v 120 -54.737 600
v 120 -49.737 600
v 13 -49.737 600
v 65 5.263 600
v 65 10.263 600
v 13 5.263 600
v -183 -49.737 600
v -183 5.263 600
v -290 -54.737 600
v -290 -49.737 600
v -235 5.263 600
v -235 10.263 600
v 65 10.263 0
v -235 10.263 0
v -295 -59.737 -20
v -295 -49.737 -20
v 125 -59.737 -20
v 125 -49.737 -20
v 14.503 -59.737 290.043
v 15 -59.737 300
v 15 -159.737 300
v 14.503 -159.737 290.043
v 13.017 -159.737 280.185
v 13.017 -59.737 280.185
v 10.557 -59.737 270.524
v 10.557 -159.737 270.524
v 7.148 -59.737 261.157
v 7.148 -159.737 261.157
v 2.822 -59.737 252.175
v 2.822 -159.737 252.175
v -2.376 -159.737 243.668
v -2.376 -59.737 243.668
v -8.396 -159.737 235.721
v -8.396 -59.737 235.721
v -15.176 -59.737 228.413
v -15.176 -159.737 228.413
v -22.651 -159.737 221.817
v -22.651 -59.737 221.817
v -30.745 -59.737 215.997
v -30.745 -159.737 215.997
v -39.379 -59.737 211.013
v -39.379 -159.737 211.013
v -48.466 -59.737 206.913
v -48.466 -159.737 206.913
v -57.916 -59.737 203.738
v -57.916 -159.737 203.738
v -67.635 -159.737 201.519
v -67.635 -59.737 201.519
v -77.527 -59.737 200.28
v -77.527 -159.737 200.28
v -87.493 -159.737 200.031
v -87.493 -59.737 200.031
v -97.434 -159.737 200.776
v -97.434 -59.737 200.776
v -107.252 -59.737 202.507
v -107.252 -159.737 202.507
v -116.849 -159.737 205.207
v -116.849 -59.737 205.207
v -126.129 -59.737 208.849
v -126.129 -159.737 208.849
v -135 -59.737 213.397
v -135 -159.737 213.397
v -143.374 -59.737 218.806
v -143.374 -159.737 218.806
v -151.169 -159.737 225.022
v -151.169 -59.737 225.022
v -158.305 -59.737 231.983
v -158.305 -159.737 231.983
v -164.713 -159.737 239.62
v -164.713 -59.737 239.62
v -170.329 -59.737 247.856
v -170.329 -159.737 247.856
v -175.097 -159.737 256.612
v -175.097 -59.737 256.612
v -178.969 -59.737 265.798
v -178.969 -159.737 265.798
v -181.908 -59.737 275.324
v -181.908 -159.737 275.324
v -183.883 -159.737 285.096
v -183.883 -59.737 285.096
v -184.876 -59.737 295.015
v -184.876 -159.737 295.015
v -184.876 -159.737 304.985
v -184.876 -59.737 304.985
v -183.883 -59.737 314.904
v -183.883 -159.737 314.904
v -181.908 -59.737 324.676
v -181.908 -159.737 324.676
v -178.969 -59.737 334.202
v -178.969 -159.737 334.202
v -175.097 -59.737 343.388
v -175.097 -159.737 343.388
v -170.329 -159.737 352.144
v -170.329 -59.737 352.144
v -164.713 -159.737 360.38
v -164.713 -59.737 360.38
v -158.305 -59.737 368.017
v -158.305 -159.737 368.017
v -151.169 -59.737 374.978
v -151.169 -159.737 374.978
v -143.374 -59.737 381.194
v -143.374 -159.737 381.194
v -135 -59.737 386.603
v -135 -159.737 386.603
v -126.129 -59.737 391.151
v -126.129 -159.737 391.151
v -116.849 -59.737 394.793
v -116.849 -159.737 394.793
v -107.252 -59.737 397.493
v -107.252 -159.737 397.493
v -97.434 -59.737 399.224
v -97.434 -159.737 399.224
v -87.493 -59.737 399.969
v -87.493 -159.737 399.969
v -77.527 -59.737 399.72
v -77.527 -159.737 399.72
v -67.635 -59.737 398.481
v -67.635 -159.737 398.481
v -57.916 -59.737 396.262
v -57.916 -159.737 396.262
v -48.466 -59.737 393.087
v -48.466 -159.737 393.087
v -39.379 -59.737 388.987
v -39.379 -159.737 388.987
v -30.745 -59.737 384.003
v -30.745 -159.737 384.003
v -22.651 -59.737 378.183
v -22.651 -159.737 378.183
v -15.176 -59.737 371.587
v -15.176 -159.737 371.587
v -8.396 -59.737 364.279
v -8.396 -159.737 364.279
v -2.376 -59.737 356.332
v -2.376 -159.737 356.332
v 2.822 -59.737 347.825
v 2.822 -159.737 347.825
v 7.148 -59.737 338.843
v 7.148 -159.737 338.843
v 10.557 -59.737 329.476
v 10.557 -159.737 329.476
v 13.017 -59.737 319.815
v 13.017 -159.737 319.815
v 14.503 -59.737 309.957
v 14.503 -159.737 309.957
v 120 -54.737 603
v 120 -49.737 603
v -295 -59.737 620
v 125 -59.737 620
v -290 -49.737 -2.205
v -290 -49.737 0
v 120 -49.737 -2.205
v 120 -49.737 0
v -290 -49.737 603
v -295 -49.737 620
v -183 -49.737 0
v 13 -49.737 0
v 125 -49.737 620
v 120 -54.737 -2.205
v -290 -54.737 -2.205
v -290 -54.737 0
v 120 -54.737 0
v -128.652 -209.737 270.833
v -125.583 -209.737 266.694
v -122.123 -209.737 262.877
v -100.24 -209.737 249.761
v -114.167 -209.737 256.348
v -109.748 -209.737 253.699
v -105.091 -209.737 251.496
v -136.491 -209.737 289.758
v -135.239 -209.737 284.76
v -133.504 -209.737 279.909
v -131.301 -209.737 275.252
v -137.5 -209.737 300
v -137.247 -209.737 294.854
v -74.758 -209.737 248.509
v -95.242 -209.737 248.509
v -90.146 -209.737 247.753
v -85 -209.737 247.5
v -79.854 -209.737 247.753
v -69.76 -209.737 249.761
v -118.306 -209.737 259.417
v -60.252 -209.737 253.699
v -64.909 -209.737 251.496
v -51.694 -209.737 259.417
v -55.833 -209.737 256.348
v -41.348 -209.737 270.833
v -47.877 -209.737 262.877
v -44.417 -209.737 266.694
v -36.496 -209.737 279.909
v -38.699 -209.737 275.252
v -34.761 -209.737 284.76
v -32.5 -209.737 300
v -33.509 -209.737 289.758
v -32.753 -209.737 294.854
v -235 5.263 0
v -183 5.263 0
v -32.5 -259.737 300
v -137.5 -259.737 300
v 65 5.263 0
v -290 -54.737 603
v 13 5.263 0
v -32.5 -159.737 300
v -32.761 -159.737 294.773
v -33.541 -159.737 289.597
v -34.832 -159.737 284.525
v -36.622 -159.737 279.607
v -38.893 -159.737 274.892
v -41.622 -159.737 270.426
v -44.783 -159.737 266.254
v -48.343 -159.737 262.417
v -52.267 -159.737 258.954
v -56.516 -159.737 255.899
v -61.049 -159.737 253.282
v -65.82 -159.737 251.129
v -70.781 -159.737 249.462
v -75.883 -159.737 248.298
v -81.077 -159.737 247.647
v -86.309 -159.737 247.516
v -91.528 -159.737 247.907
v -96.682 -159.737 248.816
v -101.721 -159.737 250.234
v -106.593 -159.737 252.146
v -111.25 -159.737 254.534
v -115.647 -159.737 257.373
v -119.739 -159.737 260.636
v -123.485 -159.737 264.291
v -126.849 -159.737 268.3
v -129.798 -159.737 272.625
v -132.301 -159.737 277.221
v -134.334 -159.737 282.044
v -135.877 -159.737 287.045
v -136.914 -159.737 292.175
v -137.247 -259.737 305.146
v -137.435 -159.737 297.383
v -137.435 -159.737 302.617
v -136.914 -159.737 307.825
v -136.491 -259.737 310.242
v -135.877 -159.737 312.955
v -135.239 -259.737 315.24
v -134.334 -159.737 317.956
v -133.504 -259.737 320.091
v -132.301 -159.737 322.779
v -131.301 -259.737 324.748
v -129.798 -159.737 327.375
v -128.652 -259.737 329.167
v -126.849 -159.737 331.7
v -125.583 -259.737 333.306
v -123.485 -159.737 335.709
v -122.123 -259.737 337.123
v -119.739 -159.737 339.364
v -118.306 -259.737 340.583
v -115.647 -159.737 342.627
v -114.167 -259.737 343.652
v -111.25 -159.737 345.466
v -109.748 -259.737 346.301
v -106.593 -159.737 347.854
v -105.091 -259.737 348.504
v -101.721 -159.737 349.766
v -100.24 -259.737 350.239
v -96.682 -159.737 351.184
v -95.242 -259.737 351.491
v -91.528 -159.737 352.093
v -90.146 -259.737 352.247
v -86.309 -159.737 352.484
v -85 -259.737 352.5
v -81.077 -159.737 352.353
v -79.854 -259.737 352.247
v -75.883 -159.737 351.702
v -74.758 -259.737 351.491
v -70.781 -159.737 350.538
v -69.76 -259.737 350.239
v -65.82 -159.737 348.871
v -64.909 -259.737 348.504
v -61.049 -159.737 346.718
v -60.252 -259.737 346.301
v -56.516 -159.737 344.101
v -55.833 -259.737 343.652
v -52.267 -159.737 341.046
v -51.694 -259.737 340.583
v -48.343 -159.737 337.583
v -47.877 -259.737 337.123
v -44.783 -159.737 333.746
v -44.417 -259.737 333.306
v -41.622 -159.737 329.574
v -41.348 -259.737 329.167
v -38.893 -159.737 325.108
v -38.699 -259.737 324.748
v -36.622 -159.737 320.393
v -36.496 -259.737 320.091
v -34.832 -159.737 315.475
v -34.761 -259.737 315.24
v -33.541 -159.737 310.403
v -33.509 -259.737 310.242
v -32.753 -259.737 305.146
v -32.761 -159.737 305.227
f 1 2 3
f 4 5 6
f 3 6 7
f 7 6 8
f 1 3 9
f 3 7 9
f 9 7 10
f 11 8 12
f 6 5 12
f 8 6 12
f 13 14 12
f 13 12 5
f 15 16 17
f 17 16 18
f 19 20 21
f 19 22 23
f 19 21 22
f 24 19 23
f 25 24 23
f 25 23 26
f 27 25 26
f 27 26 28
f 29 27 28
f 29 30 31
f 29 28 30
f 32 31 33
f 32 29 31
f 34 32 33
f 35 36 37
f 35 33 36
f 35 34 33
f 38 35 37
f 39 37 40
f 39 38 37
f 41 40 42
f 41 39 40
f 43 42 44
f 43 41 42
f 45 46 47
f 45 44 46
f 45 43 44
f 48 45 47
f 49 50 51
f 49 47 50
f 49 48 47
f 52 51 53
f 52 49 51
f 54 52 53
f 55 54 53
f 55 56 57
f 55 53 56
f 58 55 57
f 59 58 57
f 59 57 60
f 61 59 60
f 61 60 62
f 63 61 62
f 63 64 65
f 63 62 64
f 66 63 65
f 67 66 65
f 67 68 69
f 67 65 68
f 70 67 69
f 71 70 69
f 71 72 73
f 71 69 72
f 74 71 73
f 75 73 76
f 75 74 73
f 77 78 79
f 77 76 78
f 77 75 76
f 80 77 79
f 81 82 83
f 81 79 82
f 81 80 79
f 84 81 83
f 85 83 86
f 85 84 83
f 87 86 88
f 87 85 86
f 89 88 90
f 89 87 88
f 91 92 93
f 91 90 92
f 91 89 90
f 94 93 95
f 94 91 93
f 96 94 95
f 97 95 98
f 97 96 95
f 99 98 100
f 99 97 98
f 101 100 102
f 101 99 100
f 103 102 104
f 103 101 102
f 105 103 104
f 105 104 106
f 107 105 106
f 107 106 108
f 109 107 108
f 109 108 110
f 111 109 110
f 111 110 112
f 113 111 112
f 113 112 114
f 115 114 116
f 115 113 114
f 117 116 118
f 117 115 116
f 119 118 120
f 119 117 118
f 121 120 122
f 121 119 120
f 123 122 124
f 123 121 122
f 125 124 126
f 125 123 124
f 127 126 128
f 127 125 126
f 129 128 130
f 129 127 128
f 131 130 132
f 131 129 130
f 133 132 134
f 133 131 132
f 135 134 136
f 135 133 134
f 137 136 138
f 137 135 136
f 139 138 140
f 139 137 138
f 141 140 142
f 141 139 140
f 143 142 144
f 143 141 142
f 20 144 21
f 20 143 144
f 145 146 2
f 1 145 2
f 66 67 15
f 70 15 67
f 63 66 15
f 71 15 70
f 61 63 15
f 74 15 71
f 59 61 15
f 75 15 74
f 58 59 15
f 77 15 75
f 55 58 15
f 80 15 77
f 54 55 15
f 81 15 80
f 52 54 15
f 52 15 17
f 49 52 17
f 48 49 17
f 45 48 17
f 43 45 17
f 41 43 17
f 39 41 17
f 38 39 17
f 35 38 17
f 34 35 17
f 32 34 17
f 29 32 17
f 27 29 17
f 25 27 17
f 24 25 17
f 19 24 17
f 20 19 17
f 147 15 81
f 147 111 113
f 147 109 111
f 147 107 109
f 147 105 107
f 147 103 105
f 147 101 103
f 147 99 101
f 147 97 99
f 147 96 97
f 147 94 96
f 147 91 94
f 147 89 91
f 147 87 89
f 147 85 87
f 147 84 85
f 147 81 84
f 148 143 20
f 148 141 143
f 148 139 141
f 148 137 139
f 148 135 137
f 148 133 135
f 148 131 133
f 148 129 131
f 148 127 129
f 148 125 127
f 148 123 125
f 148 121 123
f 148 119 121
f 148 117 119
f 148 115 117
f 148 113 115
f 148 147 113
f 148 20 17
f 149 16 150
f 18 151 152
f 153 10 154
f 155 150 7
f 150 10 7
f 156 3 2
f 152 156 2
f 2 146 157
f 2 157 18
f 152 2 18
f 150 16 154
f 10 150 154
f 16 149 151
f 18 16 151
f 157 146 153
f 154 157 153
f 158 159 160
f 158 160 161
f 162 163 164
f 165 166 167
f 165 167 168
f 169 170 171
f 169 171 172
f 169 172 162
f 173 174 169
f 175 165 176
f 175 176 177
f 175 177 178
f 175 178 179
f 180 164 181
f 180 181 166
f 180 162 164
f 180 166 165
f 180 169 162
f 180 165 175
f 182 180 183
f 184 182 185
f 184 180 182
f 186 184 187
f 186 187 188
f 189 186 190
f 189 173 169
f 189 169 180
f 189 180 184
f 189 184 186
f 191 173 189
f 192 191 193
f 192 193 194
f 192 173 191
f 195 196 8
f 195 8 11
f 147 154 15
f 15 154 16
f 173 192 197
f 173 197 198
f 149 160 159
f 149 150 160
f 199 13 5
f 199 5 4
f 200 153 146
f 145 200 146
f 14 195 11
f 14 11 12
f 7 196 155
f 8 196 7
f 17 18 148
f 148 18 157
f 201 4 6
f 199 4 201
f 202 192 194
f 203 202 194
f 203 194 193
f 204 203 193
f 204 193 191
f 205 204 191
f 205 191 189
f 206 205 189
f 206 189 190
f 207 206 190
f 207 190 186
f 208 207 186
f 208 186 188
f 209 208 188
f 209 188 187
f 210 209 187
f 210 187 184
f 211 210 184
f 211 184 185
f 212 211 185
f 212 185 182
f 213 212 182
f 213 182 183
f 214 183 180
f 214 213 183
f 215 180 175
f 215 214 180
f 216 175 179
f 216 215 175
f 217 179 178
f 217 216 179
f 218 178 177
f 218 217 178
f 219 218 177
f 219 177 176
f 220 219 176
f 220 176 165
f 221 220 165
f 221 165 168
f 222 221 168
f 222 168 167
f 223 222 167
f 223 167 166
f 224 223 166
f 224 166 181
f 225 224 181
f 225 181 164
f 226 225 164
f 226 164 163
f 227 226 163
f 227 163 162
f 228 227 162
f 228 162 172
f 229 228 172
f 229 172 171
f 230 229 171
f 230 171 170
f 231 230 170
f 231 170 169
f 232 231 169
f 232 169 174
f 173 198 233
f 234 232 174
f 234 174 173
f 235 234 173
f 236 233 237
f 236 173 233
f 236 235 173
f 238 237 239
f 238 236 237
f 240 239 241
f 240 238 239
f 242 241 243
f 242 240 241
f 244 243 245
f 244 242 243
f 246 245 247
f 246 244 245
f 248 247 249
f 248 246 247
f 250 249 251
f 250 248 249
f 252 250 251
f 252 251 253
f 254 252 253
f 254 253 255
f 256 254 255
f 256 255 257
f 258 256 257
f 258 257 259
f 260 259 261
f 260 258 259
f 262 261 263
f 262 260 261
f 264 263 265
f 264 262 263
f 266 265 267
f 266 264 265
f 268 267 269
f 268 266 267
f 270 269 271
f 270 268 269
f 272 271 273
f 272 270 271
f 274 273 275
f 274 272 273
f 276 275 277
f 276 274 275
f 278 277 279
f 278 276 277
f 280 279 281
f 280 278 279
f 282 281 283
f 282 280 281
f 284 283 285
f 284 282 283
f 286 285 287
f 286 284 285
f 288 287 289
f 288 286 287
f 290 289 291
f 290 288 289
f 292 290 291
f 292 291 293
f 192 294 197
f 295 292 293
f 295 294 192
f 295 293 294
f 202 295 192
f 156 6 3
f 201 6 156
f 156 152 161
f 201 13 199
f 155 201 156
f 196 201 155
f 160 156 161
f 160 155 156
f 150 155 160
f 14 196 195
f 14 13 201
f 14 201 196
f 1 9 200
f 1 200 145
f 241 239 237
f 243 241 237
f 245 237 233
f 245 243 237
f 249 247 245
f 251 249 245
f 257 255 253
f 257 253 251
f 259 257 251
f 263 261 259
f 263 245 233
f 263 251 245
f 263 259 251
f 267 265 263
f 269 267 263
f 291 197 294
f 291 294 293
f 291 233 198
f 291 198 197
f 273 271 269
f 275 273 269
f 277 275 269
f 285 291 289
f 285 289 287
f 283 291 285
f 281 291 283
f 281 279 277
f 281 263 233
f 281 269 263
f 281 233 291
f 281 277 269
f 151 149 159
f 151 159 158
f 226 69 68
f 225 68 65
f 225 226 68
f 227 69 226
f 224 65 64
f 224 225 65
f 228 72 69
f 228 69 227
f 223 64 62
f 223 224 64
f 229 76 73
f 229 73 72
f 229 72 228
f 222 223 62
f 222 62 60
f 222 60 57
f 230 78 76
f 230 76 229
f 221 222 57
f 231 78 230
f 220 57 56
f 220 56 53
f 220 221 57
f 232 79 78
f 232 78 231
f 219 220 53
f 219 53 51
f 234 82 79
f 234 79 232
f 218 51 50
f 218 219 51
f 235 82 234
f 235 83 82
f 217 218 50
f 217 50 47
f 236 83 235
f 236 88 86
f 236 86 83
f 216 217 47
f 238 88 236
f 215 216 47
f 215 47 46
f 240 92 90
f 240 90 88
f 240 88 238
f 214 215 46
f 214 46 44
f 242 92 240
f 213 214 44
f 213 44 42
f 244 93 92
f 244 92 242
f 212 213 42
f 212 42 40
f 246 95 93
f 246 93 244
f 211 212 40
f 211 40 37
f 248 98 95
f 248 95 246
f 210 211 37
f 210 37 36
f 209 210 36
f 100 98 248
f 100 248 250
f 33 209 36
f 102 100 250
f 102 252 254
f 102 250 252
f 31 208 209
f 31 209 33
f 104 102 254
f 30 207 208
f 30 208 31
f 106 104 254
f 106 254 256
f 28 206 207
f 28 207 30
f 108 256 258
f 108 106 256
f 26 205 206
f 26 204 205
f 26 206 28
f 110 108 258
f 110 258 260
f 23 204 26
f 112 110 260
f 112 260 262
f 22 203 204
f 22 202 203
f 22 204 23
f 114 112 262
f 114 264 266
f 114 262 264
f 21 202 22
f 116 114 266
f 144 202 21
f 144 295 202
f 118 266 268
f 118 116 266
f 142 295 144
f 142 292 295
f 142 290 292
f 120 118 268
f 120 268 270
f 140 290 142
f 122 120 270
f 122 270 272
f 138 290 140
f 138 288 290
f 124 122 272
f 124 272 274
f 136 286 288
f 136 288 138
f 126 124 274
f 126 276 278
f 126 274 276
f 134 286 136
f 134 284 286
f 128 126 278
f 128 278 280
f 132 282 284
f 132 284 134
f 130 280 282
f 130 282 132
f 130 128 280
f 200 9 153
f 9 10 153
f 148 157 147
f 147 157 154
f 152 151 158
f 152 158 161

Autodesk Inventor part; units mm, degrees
ref_plane "YZ Plane" through (0, 0, 0) normal (1, 0, 0) x (0, 1, 0)
ref_plane "XZ Plane" through (0, 0, 0) normal (0, 1, 0) x (-1, 0, 0)
ref_plane "XY Plane" through (0, 0, 0) normal (0, 0, 1) x (1, 0, 0)
sketch "スケッチ1" plane through (0, 0, 0) normal (0, 0, 1) x (1, 0, 0)
  line L0 (-235, 10.2629) -> (65, 10.2629)
  line L1 (65, 10.2629) -> (65, 5.2629)
  line L2 (65, 5.2629) -> (-235, 5.2629)
  line L3 (-235, 5.2629) -> (-235, 10.2629)
  line L4 (-235, 10.2629) -> (65, 5.2629) construction
  line L5 (65, 10.2629) -> (-235, 5.2629) construction
  point P0 (0, 0)
  point P1 (-85, 7.7629)
  dimension "d0" = 300
  dimension "d1" = 5
extrude "押し出し1" add sketch "スケッチ1" along normal blind 600
sketch "スケッチ2" plane through (-235, 5.2629, 0) normal (0, -1, 0) x (1, 0, 0)
  line L0 (50, 0) -> (250, 0)
  line L1 (250, 0) -> (250, 600)
  line L2 (250, 600) -> (50, 600)
  line L3 (50, 600) -> (50, 0)
  line L4 (300, 0) -> (0, 0) projected
  line L5 (0, 0) -> (0, 600) projected
  point P0 (235, 0)
  dimension "d4" = 200
  dimension "d5" = 600
  dimension "d6" = 0
  dimension "d7" = 50
extrude "押し出し2" add sketch "スケッチ2" along normal blind 55
sketch "スケッチ3" plane through (-235, -49.7371, 0) normal (0, -1, 0) x (1, 0, 0)
  line L0 (-60, -20) -> (360, -20)
  line L1 (360, -20) -> (360, 620)
  line L2 (360, 620) -> (-60, 620)
  line L3 (-60, 620) -> (-60, -20)
  line L4 (0, 0) -> (300, 0) projected
  line L5 (0, 0) -> (0, 600) projected
  point P0 (235, 0)
  dimension "d10" = 420
  dimension "d11" = 640
  dimension "d12" = 20
  dimension "d13" = 60
extrude "押し出し3" add sketch "スケッチ3" along normal blind 10
sketch "スケッチ4" plane through (-235, -49.7371, 0) normal (0, 1, 0) x (1, 0, 0)
  line L0 (-55, 2.2049) -> (355, 2.2049)
  line L1 (355, 2.2049) -> (355, 0)
  line L2 (355, 0) -> (-55, 0)
  line L3 (-55, 0) -> (-55, 2.2049)
  line L4 (-60, -620) -> (-60, 20) projected
  line L5 (-60, 20) -> (360, 20) projected
  line L6 (-55, -603) -> (355, -603)
  line L7 (355, -603) -> (355, -600)
  line L8 (355, -600) -> (-55, -600)
  line L9 (-55, -600) -> (-55, -603)
  line L10 (360, -620) -> (-60, -620) projected
  point P0 (235, 0)
  dimension "d16" = 410
  dimension "d17" = 5
  dimension "d18" = 20
  dimension "d19" = 410
  dimension "d20" = 3
  dimension "d21" = 20
  dimension "d22" = 5
extrude "押し出し4" cut sketch "スケッチ4" against normal blind 5
sketch "スケッチ5" plane through (15, 5.2629, 600) normal (1, 0, 0) x (0, 0, -1)
  line L0 (600, 0) -> (600, -55) projected
  line L1 (0, 0) -> (600, 0)
  line L2 (600, 0) -> (600, -55)
  line L3 (600, -55) -> (0, -55)
  line L4 (0, -55) -> (0, 0)
  point P0 (600, -5.2629)
extrude "押し出し5" cut sketch "スケッチ5" against normal blind 2
sketch "スケッチ6" plane through (-185, 5.2629, 0) normal (-1, 0, 0) x (0, 0, 1)
  line L0 (0, 0) -> (600, 0) projected
  line L1 (-20, -55) -> (620, -55) projected
  line L2 (0, 0) -> (600, 0)
  line L3 (600, 0) -> (600, -55)
  line L4 (600, -55) -> (0, -55)
  line L5 (0, -55) -> (0, 0)
  point P0 (0, -5.2629)
extrude "押し出し6" cut sketch "スケッチ6" against normal blind 2
sketch "スケッチ7" plane through (-235, -59.7371, 0) normal (0, -1, 0) x (1, 0, 0)
  circle A0 centre (150, 300) radius 100
  line L0 (-60, 620) -> (-60, -20) projected
  line L1 (-60, -20) -> (360, -20) projected
  point P0 (235, 0)
  dimension "d29" = 200
  dimension "d30" = 210
  dimension "d31" = 320
extrude "押し出し7" add sketch "スケッチ7" along normal blind 100
sketch "スケッチ8" plane through (-85, -159.7371, 300) normal (0, -1, 0) x (1, 0, 0)
  circle A0 centre (0, 0) radius 52.5
  point P0 (85, -300)
  dimension "d34" = 105
extrude "押し出し8" add sketch "スケッチ8" along normal blind 50
sketch "スケッチ9" plane through (-85, -209.7371, 300) normal (0, -1, 0) x (1, 0, 0)
  arc A0 (52.5, 0) -> (-52.5, 0) centre (0, 0) ccw
  line L0 (52.5, 0) -> (-52.5, 0)
  point P0 (85, -300)
  dimension "d37" = 105
extrude "押し出し9" add sketch "スケッチ9" along normal blind 50
properties part number "nasel_stand"
